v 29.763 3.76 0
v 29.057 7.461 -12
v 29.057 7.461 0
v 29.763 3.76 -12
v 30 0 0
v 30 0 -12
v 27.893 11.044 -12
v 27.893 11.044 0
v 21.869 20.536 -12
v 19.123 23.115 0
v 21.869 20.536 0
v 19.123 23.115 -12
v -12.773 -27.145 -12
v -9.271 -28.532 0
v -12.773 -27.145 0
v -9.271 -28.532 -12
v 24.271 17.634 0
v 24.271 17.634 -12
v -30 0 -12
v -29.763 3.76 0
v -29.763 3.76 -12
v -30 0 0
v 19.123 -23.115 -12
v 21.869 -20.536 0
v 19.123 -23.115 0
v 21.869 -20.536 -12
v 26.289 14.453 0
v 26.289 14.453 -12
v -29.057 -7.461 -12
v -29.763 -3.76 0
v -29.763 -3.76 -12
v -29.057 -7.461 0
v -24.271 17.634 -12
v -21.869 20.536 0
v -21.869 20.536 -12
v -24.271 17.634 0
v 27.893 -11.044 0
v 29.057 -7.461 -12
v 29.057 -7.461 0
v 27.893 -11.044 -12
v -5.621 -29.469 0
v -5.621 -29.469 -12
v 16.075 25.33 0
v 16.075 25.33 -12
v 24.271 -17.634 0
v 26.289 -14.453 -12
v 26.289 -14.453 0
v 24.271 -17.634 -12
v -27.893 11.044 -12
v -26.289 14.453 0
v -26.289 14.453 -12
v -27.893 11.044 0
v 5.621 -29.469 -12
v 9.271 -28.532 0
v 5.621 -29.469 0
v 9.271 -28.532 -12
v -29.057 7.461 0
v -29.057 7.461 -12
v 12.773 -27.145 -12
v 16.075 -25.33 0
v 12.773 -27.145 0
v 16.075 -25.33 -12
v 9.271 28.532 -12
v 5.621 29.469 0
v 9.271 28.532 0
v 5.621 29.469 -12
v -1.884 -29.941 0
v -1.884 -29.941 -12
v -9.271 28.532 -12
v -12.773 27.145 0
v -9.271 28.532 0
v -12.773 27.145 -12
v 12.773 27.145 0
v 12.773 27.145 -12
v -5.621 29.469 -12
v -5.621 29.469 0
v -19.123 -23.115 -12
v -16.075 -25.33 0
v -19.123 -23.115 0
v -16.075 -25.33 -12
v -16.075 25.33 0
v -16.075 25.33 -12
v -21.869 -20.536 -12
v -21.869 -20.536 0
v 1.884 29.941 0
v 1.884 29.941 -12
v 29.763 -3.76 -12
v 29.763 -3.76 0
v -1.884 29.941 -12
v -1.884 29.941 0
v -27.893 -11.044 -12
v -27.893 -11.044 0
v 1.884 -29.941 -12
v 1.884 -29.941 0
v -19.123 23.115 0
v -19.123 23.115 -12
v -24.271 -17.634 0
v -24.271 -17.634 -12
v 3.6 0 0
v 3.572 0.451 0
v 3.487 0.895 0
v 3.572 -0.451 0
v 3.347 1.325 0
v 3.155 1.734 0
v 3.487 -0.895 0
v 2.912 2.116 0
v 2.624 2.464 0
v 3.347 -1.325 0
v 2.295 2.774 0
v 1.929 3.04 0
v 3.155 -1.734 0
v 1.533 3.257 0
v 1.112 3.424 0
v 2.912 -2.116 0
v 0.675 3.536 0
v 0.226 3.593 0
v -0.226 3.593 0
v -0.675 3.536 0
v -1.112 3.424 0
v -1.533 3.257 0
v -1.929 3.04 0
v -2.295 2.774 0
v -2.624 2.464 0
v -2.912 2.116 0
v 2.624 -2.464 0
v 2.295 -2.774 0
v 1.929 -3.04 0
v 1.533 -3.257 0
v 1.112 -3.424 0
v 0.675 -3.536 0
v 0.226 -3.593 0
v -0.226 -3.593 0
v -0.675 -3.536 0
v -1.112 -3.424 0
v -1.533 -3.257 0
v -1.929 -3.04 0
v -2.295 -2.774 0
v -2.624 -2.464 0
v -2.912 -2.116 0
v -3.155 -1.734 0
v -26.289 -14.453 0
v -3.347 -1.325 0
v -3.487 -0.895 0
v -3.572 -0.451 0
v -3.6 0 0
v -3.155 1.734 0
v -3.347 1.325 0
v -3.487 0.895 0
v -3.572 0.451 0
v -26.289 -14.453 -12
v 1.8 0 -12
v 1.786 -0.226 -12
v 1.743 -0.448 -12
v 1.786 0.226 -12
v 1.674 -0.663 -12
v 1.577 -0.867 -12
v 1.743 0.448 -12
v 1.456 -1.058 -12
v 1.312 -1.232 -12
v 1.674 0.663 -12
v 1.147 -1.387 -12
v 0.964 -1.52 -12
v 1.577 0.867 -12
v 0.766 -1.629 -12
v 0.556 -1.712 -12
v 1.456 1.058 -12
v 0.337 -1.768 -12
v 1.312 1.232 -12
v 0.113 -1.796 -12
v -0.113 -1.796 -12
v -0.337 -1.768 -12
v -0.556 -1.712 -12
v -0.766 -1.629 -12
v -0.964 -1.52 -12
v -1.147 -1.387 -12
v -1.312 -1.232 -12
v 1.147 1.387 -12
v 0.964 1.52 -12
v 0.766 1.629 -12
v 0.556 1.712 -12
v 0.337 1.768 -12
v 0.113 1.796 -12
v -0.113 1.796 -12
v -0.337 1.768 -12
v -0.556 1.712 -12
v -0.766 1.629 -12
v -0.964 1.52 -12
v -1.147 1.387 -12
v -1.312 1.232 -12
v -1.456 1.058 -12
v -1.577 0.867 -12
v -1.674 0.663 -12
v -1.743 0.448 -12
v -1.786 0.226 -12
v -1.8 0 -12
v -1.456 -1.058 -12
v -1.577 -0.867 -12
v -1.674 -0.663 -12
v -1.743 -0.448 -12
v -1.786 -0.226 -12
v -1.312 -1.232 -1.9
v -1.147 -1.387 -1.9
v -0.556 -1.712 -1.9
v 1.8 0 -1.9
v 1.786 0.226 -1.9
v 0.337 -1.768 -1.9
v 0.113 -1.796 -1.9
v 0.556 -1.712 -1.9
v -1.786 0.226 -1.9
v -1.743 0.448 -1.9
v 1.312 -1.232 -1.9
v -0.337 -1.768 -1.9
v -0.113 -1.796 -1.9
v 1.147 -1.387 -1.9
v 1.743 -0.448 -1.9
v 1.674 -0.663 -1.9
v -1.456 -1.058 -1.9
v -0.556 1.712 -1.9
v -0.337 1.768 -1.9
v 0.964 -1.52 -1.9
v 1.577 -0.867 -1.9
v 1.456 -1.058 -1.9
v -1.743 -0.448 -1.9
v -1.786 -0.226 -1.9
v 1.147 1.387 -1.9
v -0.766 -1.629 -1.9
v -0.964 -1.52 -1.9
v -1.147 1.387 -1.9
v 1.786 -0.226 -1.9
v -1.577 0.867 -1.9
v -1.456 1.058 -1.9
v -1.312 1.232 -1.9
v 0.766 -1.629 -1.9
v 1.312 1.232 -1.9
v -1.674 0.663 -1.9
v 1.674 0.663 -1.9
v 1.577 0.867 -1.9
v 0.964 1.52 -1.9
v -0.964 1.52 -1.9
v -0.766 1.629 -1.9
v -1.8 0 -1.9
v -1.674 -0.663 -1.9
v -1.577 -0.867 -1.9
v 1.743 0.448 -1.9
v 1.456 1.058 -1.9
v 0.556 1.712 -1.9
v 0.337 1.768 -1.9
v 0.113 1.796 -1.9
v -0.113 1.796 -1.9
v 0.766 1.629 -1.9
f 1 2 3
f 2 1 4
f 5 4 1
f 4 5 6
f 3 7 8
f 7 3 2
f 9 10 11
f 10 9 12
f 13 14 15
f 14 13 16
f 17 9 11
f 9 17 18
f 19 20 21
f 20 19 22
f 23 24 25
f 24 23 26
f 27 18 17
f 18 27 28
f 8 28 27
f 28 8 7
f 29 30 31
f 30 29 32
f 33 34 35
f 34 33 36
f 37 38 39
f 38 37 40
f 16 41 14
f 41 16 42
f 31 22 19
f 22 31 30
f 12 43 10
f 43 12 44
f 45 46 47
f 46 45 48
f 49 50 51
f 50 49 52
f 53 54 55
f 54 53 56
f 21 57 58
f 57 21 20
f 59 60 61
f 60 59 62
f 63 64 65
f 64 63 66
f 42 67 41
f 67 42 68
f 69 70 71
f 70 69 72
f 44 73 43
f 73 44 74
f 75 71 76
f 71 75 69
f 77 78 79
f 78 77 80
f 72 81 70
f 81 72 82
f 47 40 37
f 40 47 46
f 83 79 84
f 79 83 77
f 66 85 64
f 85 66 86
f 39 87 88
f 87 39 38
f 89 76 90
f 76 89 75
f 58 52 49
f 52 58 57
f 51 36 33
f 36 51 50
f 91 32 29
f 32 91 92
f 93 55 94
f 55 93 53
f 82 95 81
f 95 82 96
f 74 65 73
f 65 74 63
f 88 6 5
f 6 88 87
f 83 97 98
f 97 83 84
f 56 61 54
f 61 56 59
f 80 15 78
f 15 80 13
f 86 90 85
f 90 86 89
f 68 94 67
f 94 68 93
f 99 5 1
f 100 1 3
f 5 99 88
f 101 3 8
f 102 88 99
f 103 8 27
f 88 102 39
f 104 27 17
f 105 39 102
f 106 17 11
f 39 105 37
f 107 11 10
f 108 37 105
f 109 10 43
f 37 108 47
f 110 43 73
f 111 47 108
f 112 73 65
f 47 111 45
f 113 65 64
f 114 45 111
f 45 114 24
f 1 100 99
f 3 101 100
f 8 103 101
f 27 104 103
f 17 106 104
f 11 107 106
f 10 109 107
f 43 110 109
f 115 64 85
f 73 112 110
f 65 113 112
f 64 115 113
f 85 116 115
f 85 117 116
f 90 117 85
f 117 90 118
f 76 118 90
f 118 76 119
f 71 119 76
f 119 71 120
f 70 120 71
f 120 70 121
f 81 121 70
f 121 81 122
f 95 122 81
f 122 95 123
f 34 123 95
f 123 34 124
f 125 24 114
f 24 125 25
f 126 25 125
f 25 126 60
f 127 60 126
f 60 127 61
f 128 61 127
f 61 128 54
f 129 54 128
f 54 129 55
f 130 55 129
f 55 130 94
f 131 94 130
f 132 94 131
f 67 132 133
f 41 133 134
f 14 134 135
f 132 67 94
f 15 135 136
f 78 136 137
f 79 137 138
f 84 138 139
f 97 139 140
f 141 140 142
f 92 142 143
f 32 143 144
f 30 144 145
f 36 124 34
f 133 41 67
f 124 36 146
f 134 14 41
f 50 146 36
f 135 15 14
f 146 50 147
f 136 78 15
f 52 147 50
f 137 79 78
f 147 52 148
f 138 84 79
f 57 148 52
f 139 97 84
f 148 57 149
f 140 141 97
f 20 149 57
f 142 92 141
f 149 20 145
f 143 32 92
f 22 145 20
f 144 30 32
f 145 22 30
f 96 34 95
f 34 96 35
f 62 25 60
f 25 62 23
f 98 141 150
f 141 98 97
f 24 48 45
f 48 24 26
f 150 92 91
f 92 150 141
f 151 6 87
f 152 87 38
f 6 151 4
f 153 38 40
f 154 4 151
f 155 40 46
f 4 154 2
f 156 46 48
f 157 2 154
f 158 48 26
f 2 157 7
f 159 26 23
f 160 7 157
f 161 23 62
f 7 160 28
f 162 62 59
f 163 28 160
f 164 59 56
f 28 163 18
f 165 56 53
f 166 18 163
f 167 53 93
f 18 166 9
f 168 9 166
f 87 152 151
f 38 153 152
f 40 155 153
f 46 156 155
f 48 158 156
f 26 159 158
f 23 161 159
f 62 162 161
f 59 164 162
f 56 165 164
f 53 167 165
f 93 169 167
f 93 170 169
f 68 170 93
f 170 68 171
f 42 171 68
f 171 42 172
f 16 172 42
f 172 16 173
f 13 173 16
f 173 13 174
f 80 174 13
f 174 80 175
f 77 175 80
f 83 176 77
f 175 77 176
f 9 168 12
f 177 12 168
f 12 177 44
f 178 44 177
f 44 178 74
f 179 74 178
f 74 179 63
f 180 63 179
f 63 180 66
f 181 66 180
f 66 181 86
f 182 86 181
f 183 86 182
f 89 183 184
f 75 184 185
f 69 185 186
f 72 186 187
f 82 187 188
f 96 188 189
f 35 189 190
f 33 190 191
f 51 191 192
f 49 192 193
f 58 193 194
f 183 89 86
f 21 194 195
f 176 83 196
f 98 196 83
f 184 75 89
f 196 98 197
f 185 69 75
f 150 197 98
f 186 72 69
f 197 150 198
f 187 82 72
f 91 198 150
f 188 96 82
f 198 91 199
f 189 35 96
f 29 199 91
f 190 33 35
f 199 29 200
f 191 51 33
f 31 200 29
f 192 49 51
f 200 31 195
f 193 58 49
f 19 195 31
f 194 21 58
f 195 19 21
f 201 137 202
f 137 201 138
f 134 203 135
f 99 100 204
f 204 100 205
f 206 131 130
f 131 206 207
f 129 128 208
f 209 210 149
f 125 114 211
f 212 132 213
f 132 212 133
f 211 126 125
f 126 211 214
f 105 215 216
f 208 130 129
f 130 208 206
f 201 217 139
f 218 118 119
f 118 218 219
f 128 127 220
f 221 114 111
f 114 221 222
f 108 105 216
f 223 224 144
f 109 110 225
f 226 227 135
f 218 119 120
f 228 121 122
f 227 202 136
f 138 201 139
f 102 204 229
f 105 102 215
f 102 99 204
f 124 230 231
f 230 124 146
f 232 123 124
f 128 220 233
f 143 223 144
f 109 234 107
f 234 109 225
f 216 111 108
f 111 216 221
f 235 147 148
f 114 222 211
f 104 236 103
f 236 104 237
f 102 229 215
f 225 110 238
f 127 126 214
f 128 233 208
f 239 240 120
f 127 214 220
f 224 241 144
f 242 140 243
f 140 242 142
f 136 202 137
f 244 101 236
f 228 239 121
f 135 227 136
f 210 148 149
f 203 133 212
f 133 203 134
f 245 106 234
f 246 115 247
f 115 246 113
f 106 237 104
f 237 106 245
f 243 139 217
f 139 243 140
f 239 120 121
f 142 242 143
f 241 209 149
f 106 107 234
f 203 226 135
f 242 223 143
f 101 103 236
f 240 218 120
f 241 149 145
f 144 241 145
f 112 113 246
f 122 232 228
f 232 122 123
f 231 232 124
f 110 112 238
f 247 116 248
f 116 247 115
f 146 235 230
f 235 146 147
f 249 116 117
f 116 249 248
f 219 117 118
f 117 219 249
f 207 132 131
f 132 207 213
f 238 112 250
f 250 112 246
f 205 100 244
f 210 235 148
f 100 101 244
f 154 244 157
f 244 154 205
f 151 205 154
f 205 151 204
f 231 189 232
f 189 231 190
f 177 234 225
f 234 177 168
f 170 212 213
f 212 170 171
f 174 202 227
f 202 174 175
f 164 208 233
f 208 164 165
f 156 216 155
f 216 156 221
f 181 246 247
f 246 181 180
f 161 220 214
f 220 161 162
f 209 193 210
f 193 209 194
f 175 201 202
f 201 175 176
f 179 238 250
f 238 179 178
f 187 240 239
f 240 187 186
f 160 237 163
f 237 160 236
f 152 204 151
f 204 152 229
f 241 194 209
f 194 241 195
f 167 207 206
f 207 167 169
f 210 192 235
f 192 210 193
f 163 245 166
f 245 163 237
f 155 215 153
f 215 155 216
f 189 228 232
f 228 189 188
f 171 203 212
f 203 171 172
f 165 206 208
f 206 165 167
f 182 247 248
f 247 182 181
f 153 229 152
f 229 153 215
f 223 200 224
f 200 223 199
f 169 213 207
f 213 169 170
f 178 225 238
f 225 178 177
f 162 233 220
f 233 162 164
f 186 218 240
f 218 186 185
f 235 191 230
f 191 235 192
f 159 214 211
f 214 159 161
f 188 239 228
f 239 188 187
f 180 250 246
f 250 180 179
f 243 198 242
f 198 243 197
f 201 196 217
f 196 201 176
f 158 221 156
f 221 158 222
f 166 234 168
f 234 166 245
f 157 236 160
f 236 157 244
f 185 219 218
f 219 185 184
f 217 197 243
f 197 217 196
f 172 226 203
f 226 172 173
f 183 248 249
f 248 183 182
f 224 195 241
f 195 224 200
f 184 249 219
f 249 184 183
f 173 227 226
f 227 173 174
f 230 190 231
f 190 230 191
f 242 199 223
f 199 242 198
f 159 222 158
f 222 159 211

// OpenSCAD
$fn = 50;


difference() {
	union() {
		translate(v = [0, 0, -12.0000000000]) {
			cylinder(h = 12, r = 30.0000000000);
		}
		translate(v = [0, 0, -12.0000000000]) {
			cylinder(h = 12, r = 2.8750000000);
		}
	}
	union() {
		translate(v = [0, 0, 0]) {
			rotate(a = [0, 0, 0]) {
				difference() {
					union() {
						translate(v = [0, 0, -12.0000000000]) {
							cylinder(h = 12, r = 1.5000000000);
						}
						translate(v = [0, 0, -1.9000000000]) {
							cylinder(h = 1.9000000000, r1 = 1.8000000000, r2 = 3.6000000000);
						}
						translate(v = [0, 0, -12.0000000000]) {
							cylinder(h = 12, r = 1.8000000000);
						}
						translate(v = [0, 0, -12.0000000000]) {
							cylinder(h = 12, r = 1.5000000000);
						}
					}
					union();
				}
			}
		}
	}
}
